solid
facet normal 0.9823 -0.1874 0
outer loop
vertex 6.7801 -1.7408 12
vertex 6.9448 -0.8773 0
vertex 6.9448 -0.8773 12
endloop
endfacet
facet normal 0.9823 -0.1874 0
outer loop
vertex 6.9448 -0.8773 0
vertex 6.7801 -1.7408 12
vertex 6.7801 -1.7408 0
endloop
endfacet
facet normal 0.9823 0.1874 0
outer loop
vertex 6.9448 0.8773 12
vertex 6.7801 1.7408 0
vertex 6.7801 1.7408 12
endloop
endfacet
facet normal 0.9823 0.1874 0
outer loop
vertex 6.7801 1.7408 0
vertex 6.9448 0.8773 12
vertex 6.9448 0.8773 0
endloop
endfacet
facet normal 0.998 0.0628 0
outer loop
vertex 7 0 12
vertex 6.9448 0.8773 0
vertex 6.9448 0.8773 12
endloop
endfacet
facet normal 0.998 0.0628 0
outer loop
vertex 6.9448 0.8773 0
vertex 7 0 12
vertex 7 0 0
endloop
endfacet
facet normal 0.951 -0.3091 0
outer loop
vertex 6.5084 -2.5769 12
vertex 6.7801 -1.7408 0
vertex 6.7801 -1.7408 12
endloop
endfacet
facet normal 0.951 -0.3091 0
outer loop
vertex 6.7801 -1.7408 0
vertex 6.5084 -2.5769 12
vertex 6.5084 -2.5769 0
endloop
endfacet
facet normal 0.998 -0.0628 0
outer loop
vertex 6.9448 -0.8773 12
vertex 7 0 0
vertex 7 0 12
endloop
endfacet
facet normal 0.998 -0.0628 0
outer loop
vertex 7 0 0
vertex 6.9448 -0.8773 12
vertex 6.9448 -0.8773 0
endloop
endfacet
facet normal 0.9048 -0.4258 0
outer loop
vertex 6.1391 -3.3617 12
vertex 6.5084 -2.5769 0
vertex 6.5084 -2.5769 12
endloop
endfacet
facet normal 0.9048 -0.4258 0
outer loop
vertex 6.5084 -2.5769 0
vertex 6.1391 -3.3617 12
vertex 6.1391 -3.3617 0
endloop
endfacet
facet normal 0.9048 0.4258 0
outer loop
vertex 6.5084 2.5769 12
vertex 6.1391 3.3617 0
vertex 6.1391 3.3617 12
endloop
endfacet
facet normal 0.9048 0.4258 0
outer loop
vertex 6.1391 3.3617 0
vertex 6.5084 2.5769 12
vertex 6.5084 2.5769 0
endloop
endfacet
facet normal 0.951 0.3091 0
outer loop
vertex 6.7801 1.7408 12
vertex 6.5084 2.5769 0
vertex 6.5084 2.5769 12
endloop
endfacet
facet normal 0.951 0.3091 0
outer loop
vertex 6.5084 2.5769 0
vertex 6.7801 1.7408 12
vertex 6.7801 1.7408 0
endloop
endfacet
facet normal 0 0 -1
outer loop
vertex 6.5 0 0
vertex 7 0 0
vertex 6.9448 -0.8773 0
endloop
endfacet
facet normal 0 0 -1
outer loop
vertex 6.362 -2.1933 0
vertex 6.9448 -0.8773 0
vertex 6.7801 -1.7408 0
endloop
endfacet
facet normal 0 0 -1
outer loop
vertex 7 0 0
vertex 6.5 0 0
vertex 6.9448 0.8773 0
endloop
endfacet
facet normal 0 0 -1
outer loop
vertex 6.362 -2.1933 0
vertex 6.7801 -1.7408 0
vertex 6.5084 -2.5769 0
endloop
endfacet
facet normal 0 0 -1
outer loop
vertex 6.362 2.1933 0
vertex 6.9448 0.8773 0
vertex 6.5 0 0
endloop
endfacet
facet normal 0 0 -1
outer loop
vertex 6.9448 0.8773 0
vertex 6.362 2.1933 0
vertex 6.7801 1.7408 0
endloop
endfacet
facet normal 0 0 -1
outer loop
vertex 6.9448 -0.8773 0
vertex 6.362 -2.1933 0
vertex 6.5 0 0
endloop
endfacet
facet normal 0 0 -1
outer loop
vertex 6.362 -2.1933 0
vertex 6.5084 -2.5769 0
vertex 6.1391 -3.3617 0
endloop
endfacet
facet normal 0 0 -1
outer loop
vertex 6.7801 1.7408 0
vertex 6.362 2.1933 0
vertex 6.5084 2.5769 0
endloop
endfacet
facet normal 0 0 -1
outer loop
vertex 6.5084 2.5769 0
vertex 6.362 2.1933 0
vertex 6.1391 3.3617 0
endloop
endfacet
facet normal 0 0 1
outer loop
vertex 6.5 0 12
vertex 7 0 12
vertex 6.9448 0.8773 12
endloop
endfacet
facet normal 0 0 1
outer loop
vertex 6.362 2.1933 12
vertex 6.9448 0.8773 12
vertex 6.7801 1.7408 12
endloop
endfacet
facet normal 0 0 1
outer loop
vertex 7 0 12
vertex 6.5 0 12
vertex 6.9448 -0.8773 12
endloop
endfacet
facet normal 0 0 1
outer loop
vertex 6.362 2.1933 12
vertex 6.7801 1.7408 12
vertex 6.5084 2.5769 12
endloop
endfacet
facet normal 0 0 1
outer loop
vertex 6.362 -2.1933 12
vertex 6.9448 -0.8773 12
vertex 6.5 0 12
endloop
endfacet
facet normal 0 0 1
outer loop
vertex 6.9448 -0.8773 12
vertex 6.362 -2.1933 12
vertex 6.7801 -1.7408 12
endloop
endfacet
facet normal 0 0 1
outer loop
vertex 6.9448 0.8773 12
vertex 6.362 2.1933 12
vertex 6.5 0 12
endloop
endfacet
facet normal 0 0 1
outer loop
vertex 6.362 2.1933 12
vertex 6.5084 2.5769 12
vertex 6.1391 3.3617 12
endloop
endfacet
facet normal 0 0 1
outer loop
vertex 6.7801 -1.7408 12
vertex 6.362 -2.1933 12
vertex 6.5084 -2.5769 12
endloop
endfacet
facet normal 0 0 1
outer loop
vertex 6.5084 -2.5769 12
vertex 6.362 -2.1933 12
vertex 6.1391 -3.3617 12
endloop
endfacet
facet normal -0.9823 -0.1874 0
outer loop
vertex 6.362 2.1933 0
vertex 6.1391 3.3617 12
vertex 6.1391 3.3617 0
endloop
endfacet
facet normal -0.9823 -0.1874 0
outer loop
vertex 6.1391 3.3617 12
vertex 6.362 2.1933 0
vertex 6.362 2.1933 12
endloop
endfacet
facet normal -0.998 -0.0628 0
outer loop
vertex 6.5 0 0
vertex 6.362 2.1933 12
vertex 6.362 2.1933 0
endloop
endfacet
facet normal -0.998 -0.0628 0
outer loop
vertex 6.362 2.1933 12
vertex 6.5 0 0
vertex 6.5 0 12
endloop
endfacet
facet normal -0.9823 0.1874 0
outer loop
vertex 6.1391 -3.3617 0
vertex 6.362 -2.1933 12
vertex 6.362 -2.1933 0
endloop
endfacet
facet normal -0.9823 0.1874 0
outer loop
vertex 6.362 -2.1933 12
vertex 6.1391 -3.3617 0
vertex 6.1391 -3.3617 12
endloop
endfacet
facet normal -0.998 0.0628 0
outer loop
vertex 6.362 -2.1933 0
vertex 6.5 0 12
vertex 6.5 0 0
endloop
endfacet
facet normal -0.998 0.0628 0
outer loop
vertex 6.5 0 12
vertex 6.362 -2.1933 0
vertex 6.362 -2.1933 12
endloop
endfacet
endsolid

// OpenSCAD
$fn = 50;


difference() {
	union() {
		cylinder(h = 12, r = 7.0000000000);
		translate(v = [-14.0000000000, 0, 0]) {
			cylinder(h = 12, r = 7.0000000000);
		}
	}
	union() {
		cylinder(h = 12, r = 3.2500000000);
		cylinder(h = 12, r = 1.8000000000);
		cylinder(h = 12, r = 1.8000000000);
		cylinder(h = 12, r = 1.8000000000);
		translate(v = [-18.5000000000, 0, 0]) {
			hull() {
				translate(v = [-3.7500000000, 0.0000000000, 0]) {
					cylinder(h = 12, r = 7.5000000000);
				}
				translate(v = [3.7500000000, 0.0000000000, 0]) {
					cylinder(h = 12, r = 7.5000000000);
				}
				translate(v = [-3.7500000000, -0.0000000000, 0]) {
					cylinder(h = 12, r = 7.5000000000);
				}
				translate(v = [3.7500000000, -0.0000000000, 0]) {
					cylinder(h = 12, r = 7.5000000000);
				}
			}
		}
		translate(v = [-11.0000000000, 0, 0.0000000000]) {
			cylinder(h = 12, r = 17.5000000000);
		}
	}
}
